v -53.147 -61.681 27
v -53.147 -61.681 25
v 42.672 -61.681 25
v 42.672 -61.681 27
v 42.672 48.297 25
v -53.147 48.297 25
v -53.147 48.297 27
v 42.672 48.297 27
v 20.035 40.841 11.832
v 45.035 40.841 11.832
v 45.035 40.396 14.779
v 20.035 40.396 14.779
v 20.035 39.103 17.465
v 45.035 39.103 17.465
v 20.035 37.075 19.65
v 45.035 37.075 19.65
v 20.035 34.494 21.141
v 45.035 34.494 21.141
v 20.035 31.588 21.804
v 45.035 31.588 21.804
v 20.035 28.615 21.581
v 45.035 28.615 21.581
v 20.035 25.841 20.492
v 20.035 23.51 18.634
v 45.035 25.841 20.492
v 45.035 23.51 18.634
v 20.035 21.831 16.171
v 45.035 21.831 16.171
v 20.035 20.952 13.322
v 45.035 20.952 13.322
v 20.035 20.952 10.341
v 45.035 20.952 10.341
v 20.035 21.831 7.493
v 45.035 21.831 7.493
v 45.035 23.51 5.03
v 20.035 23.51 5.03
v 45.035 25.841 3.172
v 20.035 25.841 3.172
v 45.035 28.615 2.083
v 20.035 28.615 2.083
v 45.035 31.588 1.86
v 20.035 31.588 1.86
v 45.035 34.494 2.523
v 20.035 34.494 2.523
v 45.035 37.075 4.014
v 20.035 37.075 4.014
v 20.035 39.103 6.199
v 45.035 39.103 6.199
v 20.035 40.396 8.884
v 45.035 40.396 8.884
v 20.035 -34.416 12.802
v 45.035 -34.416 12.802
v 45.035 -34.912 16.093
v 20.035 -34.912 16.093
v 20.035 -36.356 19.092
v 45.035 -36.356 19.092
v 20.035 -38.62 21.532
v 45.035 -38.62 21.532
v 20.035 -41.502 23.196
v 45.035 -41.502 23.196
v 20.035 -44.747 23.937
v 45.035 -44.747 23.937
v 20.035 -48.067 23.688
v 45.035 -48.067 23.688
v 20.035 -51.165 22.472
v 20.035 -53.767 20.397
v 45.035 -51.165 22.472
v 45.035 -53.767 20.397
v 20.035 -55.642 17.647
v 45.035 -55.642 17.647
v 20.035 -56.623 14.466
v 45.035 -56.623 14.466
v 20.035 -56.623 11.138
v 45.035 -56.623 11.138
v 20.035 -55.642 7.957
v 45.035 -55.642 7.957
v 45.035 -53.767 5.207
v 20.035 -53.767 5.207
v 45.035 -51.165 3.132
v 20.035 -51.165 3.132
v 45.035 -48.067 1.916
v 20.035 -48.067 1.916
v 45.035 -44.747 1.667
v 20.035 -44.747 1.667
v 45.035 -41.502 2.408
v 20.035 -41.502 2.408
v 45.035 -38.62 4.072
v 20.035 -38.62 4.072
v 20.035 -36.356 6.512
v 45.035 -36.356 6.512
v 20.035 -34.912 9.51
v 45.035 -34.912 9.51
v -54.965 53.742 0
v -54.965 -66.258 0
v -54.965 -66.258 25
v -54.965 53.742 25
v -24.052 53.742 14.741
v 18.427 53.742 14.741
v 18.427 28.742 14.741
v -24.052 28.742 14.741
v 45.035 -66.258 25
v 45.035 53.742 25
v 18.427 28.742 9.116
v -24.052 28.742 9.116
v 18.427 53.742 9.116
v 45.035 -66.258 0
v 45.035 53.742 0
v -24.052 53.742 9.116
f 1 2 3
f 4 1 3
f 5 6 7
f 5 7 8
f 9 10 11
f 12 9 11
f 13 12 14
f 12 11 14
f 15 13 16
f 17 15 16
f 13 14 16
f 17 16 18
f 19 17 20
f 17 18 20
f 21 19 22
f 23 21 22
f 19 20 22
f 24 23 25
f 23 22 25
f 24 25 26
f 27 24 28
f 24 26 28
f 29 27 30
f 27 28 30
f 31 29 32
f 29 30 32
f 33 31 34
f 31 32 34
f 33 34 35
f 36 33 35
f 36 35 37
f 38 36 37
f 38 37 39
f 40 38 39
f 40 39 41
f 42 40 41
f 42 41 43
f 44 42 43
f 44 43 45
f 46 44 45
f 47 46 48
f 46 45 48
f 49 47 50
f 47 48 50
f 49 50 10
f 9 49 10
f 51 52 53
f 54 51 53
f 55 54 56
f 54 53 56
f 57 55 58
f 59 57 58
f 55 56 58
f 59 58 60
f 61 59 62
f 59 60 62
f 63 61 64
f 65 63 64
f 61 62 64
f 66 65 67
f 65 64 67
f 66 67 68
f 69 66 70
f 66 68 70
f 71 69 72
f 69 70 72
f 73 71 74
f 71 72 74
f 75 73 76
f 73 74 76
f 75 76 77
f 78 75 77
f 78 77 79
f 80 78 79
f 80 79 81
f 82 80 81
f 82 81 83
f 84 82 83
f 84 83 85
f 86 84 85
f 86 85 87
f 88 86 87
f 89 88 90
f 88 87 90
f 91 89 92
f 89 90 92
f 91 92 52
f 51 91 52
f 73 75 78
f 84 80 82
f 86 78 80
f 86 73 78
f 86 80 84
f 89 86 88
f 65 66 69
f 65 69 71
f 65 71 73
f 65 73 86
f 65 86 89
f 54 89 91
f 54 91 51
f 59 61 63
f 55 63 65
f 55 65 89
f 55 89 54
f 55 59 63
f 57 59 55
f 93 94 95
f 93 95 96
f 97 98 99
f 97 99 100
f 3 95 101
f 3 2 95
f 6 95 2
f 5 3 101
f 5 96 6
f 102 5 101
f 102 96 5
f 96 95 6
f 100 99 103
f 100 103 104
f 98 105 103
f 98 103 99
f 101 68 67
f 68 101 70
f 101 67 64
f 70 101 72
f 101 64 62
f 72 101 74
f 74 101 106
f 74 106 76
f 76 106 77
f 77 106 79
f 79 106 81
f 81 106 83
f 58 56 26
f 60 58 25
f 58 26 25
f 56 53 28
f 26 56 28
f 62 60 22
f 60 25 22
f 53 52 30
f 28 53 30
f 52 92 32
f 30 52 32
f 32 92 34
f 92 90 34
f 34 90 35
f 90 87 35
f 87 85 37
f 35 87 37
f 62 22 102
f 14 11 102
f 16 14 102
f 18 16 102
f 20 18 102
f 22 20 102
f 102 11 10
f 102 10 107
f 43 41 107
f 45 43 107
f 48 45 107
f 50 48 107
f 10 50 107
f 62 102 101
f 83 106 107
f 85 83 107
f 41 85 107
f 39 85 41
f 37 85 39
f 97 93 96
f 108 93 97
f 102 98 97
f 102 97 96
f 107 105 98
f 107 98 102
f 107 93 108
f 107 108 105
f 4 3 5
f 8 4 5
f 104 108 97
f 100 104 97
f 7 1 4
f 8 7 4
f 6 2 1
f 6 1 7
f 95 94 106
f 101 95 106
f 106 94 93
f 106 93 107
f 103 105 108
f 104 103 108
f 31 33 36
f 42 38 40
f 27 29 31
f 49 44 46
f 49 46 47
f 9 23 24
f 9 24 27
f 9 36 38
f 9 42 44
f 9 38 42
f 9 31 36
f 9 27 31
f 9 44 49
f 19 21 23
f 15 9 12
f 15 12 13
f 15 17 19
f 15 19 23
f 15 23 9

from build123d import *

# Parameters (mm, degrees)
F0_W     = 100
F0_H     = 120
F1_DEPTH = 25
F2_R     = 11.166084
F3_DEPTH = 25
F4_R     = 10
F5_DEPTH = 25
F7_W     = 95.818966
F7_H     = 109.978452
F8_DEPTH = 2
F6_W     = 42.47845
F6_H     = 5.625
F9_DEPTH = 25


with BuildPart() as f1:
    # F0 (on Top) → F1 (new body)
    with BuildSketch(Plane.XY):
        with Locations((-4.964511, -6.258356)):
            Rectangle(F0_W, F0_H)
    extrude(amount=F1_DEPTH)

    # F2 (on face) → F3 (cut)
    with BuildSketch(Plane.YZ.offset(45.035489)):
        with Locations((-45.5819, 12.801725)):
            Circle(F2_R)
    extrude(amount=-F3_DEPTH, mode=Mode.SUBTRACT)

    # F4 (on face) → F5 (cut)
    with BuildSketch(Plane.YZ.offset(45.035489)):
        with Locations((30.840518, 11.831897)):
            Circle(F4_R)
    extrude(amount=-F5_DEPTH, mode=Mode.SUBTRACT)

    # F7 (on face) → F8 (join)
    with BuildSketch(Plane.XY.offset(25)):
        with Locations((-5.237069, -6.69181)):
            Rectangle(F7_W, F7_H)
    extrude(amount=F8_DEPTH)

    # F6 (on face) → F9 (cut)
    with BuildSketch(Plane(origin=(0, 53.741644, 0), x_dir=(-1, 0, 0), z_dir=(0, 1, 0))):
        with Locations((2.812499, 11.92888)):
            Rectangle(F6_W, F6_H)
    extrude(amount=-F9_DEPTH, mode=Mode.SUBTRACT)


solid = f1.part
